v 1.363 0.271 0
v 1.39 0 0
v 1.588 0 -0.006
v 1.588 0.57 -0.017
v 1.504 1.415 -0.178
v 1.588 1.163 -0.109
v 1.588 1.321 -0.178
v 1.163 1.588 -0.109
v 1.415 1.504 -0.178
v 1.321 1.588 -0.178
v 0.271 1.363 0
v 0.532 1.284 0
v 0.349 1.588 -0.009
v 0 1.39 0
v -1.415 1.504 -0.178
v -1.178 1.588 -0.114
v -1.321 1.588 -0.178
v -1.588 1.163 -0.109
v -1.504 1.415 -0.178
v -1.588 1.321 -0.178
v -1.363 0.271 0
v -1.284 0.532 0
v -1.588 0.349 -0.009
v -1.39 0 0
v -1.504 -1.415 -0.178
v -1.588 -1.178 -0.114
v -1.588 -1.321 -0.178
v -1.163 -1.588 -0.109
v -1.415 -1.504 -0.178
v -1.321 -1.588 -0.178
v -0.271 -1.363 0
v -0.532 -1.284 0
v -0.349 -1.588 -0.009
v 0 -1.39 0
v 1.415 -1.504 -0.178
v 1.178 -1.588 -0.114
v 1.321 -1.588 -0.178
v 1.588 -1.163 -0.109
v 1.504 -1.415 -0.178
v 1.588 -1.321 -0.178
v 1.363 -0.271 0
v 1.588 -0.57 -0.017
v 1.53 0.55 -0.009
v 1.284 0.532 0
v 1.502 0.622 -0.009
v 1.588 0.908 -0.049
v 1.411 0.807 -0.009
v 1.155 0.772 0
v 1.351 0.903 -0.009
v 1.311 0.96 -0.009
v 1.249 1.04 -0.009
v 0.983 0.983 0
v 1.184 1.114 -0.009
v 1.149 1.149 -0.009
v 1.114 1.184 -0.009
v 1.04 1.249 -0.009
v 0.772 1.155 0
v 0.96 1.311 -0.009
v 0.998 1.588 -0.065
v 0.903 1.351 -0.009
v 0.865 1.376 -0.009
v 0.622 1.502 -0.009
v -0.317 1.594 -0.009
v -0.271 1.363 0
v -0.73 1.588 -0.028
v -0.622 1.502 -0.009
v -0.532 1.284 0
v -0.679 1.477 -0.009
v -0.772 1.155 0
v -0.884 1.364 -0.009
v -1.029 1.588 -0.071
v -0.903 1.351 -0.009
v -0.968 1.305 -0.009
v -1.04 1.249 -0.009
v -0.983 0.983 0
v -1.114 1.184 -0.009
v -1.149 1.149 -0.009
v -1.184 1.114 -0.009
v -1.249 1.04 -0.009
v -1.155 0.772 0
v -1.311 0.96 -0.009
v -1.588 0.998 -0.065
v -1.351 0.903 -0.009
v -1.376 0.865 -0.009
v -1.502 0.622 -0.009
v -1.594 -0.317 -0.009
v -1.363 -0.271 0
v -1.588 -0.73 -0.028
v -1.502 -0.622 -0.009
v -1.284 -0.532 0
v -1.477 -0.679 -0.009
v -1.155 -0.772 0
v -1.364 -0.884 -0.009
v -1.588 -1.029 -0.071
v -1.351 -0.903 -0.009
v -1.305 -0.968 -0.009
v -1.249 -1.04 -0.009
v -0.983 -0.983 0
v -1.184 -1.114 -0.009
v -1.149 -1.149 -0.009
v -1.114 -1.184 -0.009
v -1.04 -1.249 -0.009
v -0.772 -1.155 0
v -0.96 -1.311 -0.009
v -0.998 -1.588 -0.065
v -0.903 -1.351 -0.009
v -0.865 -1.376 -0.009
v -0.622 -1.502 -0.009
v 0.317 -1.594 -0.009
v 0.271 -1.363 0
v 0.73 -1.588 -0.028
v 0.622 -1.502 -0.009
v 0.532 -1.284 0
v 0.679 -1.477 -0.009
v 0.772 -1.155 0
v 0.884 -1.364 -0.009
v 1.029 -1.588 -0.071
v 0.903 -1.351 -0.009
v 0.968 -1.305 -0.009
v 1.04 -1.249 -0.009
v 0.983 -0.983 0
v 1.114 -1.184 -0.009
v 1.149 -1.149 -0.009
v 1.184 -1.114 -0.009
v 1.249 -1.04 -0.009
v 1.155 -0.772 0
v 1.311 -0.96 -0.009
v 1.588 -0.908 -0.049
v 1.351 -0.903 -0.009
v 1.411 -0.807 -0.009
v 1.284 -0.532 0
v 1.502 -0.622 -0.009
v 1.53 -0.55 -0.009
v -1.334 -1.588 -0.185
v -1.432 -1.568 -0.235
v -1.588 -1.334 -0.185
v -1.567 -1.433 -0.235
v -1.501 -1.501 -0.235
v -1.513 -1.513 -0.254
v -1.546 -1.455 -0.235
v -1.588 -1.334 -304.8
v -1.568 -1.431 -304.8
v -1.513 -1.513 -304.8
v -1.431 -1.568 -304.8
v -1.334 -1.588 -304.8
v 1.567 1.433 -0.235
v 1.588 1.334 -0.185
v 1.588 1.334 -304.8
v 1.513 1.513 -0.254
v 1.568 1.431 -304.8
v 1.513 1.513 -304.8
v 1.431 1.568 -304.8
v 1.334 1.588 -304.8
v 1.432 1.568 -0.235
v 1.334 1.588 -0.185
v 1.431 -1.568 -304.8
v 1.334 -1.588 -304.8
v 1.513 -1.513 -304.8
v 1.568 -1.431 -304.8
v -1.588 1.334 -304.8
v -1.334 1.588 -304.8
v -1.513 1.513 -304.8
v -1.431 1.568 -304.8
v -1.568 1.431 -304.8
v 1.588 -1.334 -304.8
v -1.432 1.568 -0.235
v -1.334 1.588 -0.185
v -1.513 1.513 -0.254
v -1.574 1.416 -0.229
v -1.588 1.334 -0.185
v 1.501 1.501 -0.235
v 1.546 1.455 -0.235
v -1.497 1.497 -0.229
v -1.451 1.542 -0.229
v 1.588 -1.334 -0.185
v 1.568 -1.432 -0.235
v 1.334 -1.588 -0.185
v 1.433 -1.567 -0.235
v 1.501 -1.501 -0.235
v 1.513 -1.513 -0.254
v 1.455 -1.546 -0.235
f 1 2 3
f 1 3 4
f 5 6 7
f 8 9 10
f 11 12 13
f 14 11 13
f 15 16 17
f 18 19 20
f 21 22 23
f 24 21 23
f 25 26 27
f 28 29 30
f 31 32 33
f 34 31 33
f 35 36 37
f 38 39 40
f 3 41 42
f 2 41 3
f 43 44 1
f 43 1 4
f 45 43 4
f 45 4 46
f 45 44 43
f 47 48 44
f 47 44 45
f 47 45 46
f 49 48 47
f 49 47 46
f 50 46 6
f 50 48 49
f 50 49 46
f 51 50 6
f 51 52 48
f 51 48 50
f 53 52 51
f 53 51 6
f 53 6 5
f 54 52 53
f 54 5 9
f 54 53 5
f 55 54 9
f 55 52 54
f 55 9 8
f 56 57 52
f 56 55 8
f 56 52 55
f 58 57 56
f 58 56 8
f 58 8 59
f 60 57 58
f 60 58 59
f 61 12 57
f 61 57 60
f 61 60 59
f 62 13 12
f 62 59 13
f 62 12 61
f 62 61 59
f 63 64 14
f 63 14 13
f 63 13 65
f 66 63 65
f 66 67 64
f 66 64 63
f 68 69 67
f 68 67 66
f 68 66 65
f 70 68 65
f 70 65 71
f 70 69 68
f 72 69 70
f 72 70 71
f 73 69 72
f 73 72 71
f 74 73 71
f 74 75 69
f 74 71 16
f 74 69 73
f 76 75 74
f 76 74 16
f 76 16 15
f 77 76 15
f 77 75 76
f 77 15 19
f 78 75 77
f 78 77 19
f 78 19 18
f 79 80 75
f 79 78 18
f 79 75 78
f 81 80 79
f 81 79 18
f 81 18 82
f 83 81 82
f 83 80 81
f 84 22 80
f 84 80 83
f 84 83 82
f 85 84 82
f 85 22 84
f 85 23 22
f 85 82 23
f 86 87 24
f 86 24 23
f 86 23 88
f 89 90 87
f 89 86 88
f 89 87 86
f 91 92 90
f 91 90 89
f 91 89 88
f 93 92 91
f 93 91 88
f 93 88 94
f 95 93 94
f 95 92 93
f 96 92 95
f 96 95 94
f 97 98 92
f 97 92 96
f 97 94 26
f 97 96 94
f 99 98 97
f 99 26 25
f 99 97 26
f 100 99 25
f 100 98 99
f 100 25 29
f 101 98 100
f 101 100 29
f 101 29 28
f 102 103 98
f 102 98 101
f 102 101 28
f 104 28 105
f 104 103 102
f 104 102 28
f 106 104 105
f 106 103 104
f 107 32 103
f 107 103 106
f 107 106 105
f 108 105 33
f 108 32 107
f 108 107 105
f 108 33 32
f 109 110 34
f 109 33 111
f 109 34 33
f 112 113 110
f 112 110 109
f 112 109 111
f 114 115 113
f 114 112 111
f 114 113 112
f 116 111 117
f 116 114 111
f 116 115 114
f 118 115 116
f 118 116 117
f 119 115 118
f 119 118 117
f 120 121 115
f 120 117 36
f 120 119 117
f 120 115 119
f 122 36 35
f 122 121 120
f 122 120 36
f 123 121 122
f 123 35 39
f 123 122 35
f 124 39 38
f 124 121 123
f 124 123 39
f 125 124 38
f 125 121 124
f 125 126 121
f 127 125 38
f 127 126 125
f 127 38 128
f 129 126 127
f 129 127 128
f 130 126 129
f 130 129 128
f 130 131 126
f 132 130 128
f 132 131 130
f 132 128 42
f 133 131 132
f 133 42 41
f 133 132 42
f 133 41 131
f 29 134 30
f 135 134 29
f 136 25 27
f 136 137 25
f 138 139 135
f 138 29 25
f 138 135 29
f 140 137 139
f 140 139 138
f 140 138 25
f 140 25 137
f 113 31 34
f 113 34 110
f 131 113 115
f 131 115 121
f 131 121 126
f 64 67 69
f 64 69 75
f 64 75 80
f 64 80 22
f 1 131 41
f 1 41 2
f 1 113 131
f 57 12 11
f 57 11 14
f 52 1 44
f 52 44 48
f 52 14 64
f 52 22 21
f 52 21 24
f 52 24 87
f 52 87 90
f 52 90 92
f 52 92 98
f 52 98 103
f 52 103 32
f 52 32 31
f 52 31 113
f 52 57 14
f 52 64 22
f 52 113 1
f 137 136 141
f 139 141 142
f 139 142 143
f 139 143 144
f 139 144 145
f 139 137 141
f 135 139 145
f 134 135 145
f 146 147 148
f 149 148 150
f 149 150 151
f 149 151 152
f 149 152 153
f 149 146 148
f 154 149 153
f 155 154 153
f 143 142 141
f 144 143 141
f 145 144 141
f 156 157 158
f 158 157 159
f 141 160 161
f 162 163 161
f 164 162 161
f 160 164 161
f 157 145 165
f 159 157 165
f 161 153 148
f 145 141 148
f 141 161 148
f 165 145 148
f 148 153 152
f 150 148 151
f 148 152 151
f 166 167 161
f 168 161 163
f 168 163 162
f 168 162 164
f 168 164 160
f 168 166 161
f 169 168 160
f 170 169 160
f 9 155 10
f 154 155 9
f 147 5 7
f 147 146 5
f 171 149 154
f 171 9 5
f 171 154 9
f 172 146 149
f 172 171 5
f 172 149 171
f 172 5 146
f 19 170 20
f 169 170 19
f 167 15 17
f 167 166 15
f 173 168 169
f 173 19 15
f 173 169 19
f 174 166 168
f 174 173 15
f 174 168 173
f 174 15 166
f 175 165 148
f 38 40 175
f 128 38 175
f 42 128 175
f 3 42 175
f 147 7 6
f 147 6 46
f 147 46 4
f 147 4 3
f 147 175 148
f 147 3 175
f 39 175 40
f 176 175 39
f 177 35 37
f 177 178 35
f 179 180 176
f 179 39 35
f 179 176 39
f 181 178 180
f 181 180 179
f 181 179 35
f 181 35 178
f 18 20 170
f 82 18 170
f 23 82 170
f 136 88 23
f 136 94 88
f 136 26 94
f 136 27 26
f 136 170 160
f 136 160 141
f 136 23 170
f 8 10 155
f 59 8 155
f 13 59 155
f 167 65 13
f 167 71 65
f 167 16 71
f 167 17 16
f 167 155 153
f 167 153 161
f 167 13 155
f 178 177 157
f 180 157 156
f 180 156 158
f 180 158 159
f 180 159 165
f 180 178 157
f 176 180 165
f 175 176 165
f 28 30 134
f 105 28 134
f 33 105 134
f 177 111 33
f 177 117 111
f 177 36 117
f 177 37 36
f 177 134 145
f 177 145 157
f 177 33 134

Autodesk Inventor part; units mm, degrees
ref_plane "YZ Plane" through (0, 0, 0) normal (1, 0, 0) x (0, 1, 0)
sketch "Sketch1" plane through (0, 0, 0) normal (0, 0, 1) x (1, 0, 0)
  line L0 (-1.5875, 0.3779) -> (-1.5875, -0.3779)
  arc A0 (-1.5875, -0.3779) -> (-0.3779, -1.5875) centre (0, 0) ccw
  line L1 (-0.3779, -1.5875) -> (0.3779, -1.5875)
  arc A1 (0.3779, -1.5875) -> (1.5875, -0.3779) centre (0, 0) ccw
  line L2 (1.5875, -0.3779) -> (1.5875, 0.3779)
  arc A2 (1.5875, 0.3779) -> (0.3779, 1.5875) centre (0, 0) ccw
  line L3 (0.3779, 1.5875) -> (-0.3779, 1.5875)
  arc A3 (-0.3779, 1.5875) -> (-1.5875, 0.3779) centre (0, 0) ccw
  arc A4 (-0.3779, 1.5875) -> (-1.5875, 0.3779) centre (0, 0) ccw
  line L4 (-1.3335, 1.5875) -> (-0.3779, 1.5875)
  spline S0 degree 3 poles (-1.3335, 1.5875) (-1.3642, 1.5875) (-1.3952, 1.5821) (-1.4569, 1.558) (-1.4873, 1.5388) (-1.5387, 1.4876) (-1.5579, 1.4569) (-1.582, 1.3955) (-1.5875, 1.3643) (-1.5875, 1.3335) knots 0 0 0 0 0.000108 0.000108 0.000215 0.000215 0.000323 0.000323 0.00043 0.00043 0.00043 0.00043
  line L5 (-1.5875, 0.3779) -> (-1.5875, 1.3335)
  line L6 (1.5875, 1.3335) -> (1.5875, 0.3779)
  spline S1 degree 3 poles (1.5875, 1.3335) (1.5875, 1.3642) (1.5821, 1.3952) (1.558, 1.4569) (1.5388, 1.4873) (1.4876, 1.5387) (1.4569, 1.5579) (1.3955, 1.582) (1.3643, 1.5875) (1.3335, 1.5875) knots 0 0 0 0 0.000108 0.000108 0.000215 0.000215 0.000323 0.000323 0.00043 0.00043 0.00043 0.00043
  line L7 (0.3779, 1.5875) -> (1.3335, 1.5875)
  arc A5 (1.5875, 0.3779) -> (0.3779, 1.5875) centre (0, 0) ccw
  spline S2 degree 3 poles (1.3335, -1.5875) (1.3642, -1.5875) (1.3952, -1.5821) (1.4569, -1.558) (1.4873, -1.5388) (1.5387, -1.4876) (1.5579, -1.4569) (1.582, -1.3955) (1.5875, -1.3643) (1.5875, -1.3335) knots 0 0 0 0 0.000108 0.000108 0.000215 0.000215 0.000323 0.000323 0.00043 0.00043 0.00043 0.00043
  line L8 (1.5875, -0.3779) -> (1.5875, -1.3335)
  arc A6 (0.3779, -1.5875) -> (1.5875, -0.3779) centre (0, 0) ccw
  line L9 (1.3335, -1.5875) -> (0.3779, -1.5875)
  spline S3 degree 3 poles (-1.5875, -1.3335) (-1.5875, -1.3642) (-1.5821, -1.3952) (-1.558, -1.4569) (-1.5388, -1.4873) (-1.4876, -1.5387) (-1.4569, -1.5579) (-1.3955, -1.582) (-1.3643, -1.5875) (-1.3335, -1.5875) knots 0 0 0 0 0.000108 0.000108 0.000215 0.000215 0.000323 0.000323 0.00043 0.00043 0.00043 0.00043
  line L10 (-0.3779, -1.5875) -> (-1.3335, -1.5875)
  arc A7 (-1.5875, -0.3779) -> (-0.3779, -1.5875) centre (0, 0) ccw
  line L11 (-1.5875, -1.3335) -> (-1.5875, -0.3779)
extrude "Extrusion1" add sketch "Sketch1" against normal blind 304.8
ref_plane "Work Plane1" through (0, 0, 0) normal (0, 1, 0) x (0, 0, 1)
sketch "Sketch2" plane through (0, 0, 0) normal (0, 1, 0) x (0, 0, 1)
  spline S0 degree 3 poles (-0.1785, 2.0655) (-0.1352, 2.0163) (-0.1023, 1.9619) (-0.0534, 1.8515) (-0.0369, 1.7948) (-0.0026, 1.622) (0, 1.5057) (0, 1.3897) knots 0.006294 0.006294 0.006294 0.006294 0.006537 0.006537 0.00678 0.00678 0.007265 0.007265 0.007265 0.007265
  line L0 (0, 0) -> (0.3519, 0)
  line L1 (0.3519, 0) -> (0.3519, 2.1399)
  line L2 (0.3519, 2.1399) -> (-0.254, 2.1399)
  arc A0 (-0.1785, 2.0655) -> (-0.254, 2.1399) centre (-0.757, 1.5539) ccw
  line L3 (0, 0) -> (0, 1.3897)
  line L4 (-365.8304, 0) -> (61.3823, 0) projected
  point P0 (0, 0)
revolve "Revolution1" cut sketch "Sketch2" angle 360 about axis through (0, 0, 0) along (0, 0, 1)
ref_plane "工作平面3" through (0, 0, -304.8) normal (0, 0, 1) x (1, 0, 0)
split "分割1" plane through (0, 0, -304.8) removes the side toward (0, 0, -1)
equation "\"Length\" = 304.8"
equation "\"d4\" = -Length"
properties material "Steel"
